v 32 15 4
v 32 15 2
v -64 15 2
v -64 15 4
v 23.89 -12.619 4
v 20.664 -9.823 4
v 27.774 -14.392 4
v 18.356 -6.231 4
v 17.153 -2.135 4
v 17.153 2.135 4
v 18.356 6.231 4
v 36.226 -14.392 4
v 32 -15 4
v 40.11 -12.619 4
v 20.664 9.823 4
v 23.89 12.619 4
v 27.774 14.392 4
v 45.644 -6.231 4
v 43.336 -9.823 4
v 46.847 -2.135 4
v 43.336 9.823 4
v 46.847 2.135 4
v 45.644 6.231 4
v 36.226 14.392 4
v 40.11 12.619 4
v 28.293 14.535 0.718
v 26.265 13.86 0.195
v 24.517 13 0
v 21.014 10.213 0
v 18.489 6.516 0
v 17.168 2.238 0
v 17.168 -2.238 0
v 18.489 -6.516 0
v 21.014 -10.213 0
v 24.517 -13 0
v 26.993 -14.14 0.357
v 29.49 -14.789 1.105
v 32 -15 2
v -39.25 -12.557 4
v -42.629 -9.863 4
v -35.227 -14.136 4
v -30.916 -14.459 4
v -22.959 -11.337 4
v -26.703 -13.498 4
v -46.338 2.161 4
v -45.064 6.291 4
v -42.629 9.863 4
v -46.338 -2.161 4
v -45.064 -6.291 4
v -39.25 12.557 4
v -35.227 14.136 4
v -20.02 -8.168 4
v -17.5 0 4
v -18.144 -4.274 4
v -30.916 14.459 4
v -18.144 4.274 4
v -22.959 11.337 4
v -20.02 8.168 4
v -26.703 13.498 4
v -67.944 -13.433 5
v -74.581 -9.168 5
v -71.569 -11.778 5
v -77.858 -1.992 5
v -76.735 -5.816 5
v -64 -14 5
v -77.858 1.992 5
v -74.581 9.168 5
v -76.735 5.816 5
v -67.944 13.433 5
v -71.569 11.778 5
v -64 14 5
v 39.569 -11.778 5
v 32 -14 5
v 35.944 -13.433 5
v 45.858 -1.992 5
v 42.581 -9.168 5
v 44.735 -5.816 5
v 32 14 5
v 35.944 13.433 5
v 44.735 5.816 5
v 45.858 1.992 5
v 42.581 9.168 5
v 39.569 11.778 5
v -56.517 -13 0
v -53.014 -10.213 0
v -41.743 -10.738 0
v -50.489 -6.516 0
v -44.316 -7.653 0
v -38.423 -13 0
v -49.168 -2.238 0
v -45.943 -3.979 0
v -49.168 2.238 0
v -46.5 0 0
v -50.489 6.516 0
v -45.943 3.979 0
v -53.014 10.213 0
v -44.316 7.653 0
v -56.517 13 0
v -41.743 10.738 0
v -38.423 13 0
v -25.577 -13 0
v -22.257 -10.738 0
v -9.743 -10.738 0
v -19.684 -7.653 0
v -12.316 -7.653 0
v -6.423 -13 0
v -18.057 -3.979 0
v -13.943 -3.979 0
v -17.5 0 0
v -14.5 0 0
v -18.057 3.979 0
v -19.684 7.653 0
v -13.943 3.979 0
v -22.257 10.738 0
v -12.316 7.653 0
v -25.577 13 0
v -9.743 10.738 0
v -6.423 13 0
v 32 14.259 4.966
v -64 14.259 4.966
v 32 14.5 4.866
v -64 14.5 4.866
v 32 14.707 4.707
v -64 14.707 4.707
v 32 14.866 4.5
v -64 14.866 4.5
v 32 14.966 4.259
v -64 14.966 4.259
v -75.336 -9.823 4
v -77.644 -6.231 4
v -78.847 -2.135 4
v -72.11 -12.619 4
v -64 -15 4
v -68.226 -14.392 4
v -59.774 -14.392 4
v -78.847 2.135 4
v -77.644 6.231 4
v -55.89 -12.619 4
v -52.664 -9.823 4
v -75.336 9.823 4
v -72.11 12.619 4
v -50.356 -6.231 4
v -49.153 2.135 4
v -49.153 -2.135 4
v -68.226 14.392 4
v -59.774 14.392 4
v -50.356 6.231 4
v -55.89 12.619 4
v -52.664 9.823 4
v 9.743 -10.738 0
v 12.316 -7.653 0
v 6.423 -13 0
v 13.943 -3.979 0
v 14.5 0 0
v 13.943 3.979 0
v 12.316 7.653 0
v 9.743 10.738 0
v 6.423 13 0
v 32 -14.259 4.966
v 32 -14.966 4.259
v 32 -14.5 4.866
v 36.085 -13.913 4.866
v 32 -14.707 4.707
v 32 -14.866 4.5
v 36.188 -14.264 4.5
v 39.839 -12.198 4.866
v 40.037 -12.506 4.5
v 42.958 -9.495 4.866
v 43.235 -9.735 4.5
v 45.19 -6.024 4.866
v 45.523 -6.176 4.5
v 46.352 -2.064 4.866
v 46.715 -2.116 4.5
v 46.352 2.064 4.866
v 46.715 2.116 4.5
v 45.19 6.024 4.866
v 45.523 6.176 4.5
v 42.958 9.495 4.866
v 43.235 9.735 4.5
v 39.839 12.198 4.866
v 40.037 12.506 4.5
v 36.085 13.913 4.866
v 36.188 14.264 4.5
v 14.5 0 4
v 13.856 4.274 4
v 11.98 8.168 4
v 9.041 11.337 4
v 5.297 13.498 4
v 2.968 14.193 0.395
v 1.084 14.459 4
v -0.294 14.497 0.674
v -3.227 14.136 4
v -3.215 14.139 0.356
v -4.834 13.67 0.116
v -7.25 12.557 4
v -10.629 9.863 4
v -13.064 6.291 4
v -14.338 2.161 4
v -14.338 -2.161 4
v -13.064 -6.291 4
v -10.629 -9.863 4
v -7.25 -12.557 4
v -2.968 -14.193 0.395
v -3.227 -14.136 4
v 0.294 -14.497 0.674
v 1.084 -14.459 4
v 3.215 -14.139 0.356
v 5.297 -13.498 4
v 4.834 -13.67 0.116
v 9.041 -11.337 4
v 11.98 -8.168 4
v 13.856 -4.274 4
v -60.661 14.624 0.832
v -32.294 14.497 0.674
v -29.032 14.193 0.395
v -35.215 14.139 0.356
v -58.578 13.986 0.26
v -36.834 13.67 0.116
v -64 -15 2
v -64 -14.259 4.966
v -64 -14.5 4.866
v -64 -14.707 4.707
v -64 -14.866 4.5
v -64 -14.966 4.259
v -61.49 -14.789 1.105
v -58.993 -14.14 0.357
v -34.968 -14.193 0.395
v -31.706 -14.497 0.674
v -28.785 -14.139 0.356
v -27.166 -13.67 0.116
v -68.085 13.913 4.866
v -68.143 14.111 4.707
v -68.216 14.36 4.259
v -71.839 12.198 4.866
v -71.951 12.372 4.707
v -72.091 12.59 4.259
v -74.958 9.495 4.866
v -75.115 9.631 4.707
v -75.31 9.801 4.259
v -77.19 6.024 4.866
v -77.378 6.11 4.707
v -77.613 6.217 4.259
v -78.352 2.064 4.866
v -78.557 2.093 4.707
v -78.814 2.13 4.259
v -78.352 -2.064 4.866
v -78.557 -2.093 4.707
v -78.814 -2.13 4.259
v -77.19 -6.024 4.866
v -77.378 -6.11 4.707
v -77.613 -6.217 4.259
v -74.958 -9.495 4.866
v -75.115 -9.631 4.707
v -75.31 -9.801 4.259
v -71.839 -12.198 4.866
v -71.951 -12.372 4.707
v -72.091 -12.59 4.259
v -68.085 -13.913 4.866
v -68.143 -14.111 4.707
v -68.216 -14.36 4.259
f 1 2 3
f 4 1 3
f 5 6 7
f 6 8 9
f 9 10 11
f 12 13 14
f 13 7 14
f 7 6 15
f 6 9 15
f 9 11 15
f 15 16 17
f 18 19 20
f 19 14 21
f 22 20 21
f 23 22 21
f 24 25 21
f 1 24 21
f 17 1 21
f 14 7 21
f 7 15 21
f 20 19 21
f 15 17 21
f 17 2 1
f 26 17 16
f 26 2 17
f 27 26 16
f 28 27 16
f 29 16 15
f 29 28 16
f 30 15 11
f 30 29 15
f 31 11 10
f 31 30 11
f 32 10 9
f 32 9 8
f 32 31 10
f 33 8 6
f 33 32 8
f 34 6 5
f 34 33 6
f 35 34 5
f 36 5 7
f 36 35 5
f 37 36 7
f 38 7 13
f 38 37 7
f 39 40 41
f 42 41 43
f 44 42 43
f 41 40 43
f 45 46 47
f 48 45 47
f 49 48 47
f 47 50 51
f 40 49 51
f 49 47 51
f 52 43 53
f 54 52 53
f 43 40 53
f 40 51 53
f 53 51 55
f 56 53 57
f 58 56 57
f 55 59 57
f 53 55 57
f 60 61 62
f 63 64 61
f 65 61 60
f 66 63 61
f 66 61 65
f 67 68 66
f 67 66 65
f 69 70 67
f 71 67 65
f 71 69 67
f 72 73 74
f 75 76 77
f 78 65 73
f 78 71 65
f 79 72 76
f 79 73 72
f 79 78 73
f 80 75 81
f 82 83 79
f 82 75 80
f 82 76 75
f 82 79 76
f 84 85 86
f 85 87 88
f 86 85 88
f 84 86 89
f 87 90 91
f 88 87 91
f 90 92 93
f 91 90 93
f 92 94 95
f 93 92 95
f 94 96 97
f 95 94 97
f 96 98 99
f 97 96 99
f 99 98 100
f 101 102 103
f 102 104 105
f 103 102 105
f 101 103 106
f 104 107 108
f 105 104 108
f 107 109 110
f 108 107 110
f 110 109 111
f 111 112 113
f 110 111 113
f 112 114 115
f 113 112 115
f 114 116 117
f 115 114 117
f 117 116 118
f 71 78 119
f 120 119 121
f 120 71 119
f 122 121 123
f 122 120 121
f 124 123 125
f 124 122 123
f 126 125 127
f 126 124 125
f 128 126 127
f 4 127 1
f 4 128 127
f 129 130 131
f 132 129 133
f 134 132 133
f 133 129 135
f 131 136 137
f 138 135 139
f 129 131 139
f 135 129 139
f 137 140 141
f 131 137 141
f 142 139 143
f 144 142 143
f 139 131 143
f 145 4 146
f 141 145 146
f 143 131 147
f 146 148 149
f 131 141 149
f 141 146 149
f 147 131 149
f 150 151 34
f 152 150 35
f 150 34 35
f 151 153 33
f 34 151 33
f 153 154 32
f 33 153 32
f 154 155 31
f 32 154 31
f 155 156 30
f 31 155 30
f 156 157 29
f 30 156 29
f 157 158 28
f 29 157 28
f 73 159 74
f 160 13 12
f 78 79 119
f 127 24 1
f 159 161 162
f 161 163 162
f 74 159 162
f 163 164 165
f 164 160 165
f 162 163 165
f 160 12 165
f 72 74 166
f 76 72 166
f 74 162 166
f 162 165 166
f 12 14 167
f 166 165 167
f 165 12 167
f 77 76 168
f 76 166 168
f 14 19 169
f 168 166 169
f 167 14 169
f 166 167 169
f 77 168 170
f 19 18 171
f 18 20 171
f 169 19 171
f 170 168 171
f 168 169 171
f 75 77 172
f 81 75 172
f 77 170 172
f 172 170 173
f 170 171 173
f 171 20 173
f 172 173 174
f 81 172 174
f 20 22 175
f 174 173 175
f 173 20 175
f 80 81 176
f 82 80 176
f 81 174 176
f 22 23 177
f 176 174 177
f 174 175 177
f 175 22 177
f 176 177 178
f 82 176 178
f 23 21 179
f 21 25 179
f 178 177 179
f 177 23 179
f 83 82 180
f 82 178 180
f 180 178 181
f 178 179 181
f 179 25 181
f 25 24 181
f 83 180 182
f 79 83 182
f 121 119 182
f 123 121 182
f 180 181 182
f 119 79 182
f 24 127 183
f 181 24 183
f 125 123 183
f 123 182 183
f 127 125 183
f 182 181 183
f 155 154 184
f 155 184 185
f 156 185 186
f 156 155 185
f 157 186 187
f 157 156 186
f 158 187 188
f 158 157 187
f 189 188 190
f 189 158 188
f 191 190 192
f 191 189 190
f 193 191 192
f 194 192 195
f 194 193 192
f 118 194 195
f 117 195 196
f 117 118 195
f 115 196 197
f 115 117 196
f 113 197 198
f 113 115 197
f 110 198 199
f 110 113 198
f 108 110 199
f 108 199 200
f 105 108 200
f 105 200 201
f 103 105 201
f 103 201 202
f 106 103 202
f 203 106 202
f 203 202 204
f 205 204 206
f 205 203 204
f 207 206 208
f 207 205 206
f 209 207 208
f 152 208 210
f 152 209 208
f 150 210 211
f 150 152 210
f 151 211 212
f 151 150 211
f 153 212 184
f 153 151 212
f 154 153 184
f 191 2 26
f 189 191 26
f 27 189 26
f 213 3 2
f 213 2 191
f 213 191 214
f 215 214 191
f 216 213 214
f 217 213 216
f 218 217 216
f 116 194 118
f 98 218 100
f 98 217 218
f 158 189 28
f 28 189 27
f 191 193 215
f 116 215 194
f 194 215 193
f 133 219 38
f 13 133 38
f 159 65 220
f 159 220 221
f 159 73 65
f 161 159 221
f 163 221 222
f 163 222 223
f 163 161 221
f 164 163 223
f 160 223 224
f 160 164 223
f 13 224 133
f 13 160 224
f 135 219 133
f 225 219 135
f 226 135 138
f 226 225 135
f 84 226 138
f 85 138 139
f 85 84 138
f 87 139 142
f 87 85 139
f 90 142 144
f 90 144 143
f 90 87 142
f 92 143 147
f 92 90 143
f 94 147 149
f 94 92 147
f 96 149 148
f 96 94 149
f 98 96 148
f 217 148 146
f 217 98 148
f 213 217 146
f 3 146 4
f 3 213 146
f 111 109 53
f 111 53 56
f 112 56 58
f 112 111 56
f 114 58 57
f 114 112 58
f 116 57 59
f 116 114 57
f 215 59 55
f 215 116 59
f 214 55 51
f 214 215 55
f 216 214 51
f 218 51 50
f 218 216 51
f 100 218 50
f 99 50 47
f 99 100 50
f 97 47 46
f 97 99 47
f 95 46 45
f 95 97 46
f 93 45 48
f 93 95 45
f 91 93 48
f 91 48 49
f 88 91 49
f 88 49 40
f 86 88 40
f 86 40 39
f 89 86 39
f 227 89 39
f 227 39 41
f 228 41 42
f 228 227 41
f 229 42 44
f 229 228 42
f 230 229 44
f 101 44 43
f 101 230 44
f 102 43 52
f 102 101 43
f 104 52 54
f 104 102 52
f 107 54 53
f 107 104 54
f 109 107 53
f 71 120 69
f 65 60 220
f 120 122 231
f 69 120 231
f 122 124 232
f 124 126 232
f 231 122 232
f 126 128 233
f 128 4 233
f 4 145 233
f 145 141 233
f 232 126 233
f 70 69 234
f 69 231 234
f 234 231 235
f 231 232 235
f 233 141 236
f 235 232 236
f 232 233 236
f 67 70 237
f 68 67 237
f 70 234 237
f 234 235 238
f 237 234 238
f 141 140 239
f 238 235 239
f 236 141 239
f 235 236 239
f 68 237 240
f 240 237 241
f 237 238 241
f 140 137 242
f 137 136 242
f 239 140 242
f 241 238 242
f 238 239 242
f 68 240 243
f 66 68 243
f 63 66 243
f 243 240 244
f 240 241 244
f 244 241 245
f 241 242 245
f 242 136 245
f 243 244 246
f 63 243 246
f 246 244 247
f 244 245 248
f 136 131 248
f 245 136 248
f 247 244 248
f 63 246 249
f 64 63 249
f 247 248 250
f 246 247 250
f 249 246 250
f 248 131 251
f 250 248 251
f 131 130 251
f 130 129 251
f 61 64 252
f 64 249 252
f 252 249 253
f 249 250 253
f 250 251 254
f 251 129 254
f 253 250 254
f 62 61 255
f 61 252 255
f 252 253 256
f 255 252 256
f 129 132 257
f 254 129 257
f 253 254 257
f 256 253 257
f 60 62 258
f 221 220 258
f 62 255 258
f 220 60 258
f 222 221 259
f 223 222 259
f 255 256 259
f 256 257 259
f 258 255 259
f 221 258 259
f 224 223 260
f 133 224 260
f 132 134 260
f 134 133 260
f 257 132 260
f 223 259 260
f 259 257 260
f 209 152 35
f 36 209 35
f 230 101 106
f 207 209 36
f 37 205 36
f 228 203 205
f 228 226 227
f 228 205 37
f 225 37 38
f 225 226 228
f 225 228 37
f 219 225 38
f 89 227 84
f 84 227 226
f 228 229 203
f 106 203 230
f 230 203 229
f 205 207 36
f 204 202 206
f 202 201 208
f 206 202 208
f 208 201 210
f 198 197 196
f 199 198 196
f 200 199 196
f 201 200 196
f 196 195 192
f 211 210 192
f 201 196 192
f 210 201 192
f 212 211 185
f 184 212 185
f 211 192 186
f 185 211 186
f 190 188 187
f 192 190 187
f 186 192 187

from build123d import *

# Parameters (mm, degrees)
F0_R        = 14.5
F1_DEPTH    = 5
F2_DEPTH    = 4
F3_T1_DEPTH = 113
F4_R        = 0.99999


# Not quite as in the source:
# - a fillet or chamfer that OpenCascade refuses, or shapes differently, is made with other operations: its cross-section is extruded or revolved along the edge and cut away or added
# - a fillet or chamfer is up to 0.001 mm smaller than in the source, because OpenCascade refuses the exact size


with BuildPart() as f1:
    # F0 (on Top) → F1 (new body)
    with BuildSketch(Plane.XY):
        with BuildLine():
            ThreePointArc((47, 0), (42.6066017178, 10.6066017178), (32, 15))
            ThreePointArc((32, 15), (17, 0), (32, -15))
            ThreePointArc((32, -15), (42.6066017178, -10.6066017178), (47, 0))
        make_face()
        with BuildLine():
            ThreePointArc((-64, 15), (-53.3933982822, 10.6066017178), (-49, 0))
            ThreePointArc((-49, 0), (-53.3933982822, -10.6066017178), (-64, -15))
            Line((-64, -15), (32, -15))
            ThreePointArc((32, -15), (17, 0), (32, 15))
            Line((32, 15), (-64, 15))
        make_face()
        with Locations((-32, 0)):
            Circle(F0_R, mode=Mode.SUBTRACT)
        Circle(F0_R, mode=Mode.SUBTRACT)
        Circle(F0_R)
        with Locations((-32, 0)):
            Circle(F0_R)
        with BuildLine():
            ThreePointArc((-64, -15), (-53.3933982822, -10.6066017178), (-49, 0))
            ThreePointArc((-49, 0), (-53.3933982822, 10.6066017178), (-64, 15))
            ThreePointArc((-64, 15), (-79, 0), (-64, -15))
        make_face()
    extrude(amount=F1_DEPTH)

    # F0 (on Top) → F2 (cut)
    with BuildSketch(Plane.XY):
        with BuildLine():
            ThreePointArc((47, 0), (42.6066017178, 10.6066017178), (32, 15))
            ThreePointArc((32, 15), (17, 0), (32, -15))
            ThreePointArc((32, -15), (42.6066017178, -10.6066017178), (47, 0))
        make_face()
        Circle(F0_R)
        with Locations((-32, 0)):
            Circle(F0_R)
        with BuildLine():
            ThreePointArc((-64, -15), (-53.3933982822, -10.6066017178), (-49, 0))
            ThreePointArc((-49, 0), (-53.3933982822, 10.6066017178), (-64, 15))
            ThreePointArc((-64, 15), (-79, 0), (-64, -15))
        make_face()
    extrude(amount=F2_DEPTH, mode=Mode.SUBTRACT)

    # F3: fillet of radius 2 on 2 edges, made by hand

    # F3_s2 → F3_t1 (cut)
    with BuildSketch(Plane.YZ.offset(-72.5)):
        with BuildLine():
            ThreePointArc((-13, 0), (-14.4142135624, 0.5857864376), (-15, 2))
            Line((-15, 2), (-15, 0))
            Line((-15, 0), (-13, 0))
        make_face()
        with BuildLine():
            ThreePointArc((15, 2), (14.4142135624, 0.5857864376), (13, 0))
            Line((13, 0), (15, 0))
            Line((15, 0), (15, 2))
        make_face()
    extrude(amount=F3_T1_DEPTH, mode=Mode.SUBTRACT)

    # F4 (radius 1 in the source; OpenCascade refuses exactly that, so slightly less here)
    f4_edges = [f1.edges().sort_by_distance(p)[0] for p in [
        (47, 0, 5),
        (-16, 15, 5),
        (-79, 0, 5),
        (-16, -15, 5),
    ]]
    fillet(f4_edges, radius=F4_R)


solid = f1.part
